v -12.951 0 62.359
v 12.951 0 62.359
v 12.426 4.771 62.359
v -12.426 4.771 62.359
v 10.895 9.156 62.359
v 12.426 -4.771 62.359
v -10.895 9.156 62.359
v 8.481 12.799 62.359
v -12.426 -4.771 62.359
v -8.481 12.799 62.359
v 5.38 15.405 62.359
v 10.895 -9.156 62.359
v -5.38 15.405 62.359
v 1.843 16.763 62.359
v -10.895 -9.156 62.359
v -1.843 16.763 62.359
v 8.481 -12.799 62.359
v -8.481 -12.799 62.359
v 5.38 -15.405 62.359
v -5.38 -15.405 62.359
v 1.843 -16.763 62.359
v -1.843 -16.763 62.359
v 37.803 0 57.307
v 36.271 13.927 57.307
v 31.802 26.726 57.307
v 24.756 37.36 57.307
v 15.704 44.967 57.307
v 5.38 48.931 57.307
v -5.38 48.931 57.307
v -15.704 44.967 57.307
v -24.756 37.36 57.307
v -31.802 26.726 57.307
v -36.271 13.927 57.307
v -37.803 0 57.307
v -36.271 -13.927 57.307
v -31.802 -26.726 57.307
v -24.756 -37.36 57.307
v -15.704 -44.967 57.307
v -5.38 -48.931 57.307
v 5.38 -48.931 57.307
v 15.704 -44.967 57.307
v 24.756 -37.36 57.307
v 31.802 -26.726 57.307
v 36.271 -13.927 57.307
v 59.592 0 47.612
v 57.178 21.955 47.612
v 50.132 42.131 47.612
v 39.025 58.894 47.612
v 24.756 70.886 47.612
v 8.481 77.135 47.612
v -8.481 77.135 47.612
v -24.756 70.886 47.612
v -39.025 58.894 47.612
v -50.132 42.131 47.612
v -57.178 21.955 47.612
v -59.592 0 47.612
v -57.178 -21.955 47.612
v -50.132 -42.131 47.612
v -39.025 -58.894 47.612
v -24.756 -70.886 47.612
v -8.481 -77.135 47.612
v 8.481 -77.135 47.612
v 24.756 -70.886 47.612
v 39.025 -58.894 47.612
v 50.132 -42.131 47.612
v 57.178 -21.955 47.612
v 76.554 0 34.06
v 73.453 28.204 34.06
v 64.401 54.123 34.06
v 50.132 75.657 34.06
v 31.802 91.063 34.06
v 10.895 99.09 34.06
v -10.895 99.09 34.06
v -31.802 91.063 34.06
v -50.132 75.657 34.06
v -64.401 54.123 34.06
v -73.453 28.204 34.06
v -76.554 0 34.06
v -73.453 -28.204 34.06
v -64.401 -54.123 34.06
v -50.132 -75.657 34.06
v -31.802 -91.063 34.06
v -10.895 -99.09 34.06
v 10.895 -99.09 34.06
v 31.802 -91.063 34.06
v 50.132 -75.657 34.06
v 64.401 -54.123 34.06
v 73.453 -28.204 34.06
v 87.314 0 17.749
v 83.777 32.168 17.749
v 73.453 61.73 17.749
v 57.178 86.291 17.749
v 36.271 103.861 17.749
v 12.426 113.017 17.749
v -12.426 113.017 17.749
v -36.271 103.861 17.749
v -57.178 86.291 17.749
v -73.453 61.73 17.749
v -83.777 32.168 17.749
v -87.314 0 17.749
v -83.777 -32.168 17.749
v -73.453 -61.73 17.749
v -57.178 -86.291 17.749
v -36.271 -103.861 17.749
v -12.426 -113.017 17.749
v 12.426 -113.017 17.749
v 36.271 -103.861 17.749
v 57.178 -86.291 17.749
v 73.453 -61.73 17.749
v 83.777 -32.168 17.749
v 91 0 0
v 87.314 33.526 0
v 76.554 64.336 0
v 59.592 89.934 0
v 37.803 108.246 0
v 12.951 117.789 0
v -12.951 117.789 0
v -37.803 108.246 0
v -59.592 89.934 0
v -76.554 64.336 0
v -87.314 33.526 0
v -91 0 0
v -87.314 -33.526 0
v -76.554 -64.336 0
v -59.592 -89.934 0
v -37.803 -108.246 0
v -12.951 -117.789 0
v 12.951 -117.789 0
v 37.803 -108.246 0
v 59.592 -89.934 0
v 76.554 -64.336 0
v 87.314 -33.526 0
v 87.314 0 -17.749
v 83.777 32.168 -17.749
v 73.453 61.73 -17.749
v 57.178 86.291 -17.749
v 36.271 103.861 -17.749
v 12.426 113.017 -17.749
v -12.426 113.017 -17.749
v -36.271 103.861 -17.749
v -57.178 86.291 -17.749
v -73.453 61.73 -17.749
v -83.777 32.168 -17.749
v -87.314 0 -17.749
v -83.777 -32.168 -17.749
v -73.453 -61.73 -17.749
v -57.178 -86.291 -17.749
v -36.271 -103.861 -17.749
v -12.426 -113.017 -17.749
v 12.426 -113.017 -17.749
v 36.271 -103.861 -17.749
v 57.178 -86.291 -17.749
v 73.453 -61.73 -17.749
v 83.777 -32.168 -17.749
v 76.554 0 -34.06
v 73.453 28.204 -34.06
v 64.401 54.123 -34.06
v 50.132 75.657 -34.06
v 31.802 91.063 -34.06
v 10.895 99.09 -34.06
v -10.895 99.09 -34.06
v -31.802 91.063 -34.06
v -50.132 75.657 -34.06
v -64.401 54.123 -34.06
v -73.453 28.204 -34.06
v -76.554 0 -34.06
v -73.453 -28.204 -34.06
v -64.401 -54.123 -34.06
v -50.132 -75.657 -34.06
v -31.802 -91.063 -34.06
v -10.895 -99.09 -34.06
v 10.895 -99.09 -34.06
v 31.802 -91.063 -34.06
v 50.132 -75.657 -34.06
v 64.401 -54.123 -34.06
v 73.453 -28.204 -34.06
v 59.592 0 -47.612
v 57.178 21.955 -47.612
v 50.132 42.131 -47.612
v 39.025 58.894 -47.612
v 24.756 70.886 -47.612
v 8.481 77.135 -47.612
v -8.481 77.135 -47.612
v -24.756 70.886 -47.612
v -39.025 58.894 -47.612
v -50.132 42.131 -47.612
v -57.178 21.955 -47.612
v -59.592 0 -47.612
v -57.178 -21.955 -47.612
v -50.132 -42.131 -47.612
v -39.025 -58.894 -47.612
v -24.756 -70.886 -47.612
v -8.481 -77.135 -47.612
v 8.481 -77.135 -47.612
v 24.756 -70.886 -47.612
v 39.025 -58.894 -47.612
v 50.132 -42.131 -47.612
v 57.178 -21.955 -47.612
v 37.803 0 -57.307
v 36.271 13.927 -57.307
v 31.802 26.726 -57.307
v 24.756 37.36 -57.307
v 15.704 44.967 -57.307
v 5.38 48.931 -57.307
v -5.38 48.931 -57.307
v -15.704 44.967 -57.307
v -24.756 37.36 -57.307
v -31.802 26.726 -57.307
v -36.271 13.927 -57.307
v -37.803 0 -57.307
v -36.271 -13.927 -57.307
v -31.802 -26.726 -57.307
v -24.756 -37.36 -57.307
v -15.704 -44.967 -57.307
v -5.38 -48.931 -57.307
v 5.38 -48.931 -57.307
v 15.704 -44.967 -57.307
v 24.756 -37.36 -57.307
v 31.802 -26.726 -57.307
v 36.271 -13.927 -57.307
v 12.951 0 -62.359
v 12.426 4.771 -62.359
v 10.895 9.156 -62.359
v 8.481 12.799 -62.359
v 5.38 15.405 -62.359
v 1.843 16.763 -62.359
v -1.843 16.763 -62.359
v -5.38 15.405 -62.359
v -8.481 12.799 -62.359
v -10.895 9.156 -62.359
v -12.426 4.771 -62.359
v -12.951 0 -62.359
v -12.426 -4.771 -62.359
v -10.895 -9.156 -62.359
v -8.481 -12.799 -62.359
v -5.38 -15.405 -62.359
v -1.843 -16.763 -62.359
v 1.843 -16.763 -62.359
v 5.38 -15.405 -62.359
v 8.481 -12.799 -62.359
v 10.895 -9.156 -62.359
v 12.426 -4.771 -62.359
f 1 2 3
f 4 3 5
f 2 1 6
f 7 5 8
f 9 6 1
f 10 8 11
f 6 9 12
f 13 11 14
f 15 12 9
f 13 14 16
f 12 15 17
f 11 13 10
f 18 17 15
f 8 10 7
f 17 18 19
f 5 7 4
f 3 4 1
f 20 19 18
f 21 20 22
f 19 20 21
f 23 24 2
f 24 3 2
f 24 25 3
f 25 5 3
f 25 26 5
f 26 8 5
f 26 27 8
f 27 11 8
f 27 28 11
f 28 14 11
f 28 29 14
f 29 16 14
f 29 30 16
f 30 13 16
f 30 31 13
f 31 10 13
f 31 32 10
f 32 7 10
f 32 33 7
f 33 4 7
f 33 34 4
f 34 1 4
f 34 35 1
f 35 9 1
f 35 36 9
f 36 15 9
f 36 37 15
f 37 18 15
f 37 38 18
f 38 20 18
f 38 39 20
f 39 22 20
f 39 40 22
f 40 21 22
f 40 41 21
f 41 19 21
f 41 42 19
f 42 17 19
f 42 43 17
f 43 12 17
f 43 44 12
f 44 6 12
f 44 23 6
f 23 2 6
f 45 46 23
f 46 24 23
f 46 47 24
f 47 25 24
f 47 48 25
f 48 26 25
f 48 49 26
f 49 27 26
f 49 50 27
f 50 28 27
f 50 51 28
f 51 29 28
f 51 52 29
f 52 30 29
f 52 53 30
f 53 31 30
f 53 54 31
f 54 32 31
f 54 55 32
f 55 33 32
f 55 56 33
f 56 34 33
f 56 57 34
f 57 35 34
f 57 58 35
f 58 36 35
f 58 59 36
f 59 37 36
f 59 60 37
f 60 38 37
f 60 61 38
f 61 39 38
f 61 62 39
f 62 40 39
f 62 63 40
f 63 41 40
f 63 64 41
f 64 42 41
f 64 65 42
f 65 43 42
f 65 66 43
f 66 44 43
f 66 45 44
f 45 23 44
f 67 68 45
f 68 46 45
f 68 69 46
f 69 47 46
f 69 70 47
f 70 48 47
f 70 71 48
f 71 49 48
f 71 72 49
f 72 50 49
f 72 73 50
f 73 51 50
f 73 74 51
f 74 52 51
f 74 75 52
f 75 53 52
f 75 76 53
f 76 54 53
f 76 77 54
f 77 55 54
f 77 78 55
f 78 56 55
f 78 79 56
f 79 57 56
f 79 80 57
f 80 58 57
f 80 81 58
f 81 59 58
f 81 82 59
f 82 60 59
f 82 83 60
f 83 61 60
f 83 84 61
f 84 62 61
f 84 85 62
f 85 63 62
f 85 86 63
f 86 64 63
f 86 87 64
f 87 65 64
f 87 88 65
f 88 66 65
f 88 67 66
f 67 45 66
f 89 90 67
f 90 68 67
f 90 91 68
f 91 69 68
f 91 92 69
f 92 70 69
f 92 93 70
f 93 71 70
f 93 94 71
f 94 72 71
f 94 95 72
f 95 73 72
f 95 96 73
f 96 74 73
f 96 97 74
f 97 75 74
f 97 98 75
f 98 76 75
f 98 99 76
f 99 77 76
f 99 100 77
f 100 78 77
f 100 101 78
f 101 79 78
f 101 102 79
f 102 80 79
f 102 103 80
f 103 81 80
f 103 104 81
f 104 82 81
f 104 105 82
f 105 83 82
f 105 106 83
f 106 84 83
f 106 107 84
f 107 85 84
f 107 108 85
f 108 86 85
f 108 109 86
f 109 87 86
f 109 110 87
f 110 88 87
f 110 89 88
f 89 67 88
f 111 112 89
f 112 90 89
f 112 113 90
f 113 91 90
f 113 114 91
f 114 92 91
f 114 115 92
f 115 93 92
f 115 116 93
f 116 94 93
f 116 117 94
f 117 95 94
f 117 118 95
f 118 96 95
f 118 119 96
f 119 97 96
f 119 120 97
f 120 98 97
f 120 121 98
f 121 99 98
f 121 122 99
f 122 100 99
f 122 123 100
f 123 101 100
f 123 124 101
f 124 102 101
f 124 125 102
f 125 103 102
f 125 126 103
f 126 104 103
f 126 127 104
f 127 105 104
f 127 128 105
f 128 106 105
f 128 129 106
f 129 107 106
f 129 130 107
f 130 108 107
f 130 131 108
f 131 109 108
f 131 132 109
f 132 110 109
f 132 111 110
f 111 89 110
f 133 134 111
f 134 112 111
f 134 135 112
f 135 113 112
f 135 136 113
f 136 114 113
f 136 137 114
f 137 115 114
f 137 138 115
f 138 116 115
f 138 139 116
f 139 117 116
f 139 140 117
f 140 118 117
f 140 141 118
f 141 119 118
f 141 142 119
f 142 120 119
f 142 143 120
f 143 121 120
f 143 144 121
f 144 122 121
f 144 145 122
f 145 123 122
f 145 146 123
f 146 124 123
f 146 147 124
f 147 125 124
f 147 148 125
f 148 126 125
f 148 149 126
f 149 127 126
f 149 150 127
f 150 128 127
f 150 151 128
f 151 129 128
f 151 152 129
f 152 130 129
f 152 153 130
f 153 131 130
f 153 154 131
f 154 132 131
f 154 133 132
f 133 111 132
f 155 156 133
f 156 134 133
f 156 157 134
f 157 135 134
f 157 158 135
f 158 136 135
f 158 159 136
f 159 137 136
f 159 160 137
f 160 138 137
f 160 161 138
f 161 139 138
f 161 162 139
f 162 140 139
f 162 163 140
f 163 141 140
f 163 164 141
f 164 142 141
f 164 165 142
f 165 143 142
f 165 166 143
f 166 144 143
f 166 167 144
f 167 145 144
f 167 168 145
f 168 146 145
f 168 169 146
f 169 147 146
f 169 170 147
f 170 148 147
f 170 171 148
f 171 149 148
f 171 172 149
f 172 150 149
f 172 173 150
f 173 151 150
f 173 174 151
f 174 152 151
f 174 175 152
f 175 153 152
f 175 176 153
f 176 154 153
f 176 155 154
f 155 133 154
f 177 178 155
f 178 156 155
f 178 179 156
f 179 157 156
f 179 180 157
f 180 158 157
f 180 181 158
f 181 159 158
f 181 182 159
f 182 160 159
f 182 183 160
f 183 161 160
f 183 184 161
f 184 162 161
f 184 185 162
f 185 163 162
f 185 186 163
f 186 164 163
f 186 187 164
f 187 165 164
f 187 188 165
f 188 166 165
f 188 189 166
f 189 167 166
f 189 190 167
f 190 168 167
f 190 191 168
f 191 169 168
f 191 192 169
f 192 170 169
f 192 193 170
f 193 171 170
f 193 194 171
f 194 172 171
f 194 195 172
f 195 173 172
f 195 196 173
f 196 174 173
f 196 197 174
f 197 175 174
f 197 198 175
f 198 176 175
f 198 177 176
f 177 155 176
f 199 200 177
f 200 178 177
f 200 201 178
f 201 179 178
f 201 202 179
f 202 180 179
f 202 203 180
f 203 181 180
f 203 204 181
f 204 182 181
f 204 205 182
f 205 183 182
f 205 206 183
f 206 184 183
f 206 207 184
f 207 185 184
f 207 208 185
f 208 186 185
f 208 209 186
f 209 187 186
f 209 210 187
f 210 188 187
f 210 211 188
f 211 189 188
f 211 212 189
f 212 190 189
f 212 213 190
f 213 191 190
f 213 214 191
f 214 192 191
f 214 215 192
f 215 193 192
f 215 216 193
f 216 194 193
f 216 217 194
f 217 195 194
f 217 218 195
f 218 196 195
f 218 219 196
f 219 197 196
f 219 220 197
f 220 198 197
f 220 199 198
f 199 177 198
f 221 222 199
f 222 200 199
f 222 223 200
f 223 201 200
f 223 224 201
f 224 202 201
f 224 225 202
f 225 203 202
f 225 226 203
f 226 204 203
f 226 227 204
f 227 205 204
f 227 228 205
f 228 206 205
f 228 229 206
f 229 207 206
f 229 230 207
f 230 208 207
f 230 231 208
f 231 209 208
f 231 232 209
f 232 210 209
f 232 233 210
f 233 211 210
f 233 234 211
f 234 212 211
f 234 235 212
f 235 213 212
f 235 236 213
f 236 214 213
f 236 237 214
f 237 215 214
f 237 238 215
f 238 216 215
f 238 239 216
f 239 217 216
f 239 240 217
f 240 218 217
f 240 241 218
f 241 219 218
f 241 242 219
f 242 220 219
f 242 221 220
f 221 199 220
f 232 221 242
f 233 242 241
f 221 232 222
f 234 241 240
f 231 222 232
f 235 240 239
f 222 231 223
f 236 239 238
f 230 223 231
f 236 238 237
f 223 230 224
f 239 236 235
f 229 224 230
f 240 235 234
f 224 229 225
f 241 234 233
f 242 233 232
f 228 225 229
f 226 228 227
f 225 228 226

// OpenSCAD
// Generated by SolidPython 1.0.1 on 2020-07-29 00:46:51


scale(v = [13, 17, 9]) {
	sphere(r = 7);
}
/***********************************************
*********      SolidPython code:      **********
************************************************
 
# import packages: SolidPython
from solid import *
from solid.utils import *
from itertools import chain, combinations, permutations


class Resize:

    def __init__(self, scad_file):
        self.scad_file = scad_file
        #self.scad_file = import_scad(scad_file)
        # cone/cylinder param:
        self.r1 = 0
        self.r2 = 0
        self.h = 0
        # rectangular prism param:
        self.w = 0
        self.l = 0
        # ellipse param:
        self.r = 0

    # import OpenScad code (file name corresponds to shape)


    # classify shape + parameters
    def assign(self, param1, param2, param3):
        if self.scad_file == 'cone.scad':
            self.r1 = param1
            self.r2 = param2
            self.h = param3
        elif self.scad_file == 'cylinder.scad':
            self.r1 = param1
            self.r2 = param2
            self.h = param3
        elif self.scad_file == 'rectangularPrism.scad':
            self.h = param1
            self.l = param2
            self.w = param3
        else:
            self.r = param1
            self.h = param2

    # resize parameters
    def iterate(self):
        x = range(3, 20, 2)
        i = 1
        if self.scad_file == 'cone.scad':
            tempList = list(permutations(x, 2))
            for temp in tempList:
                param1 = temp[0]
                param2 = temp[1]
                filepath = 'produced_scad_files/' + 'cone' + str(param1) + '_' + str(param2) + '_' + '.scad'
                scad_render_to_file(cylinder(h=param1, r1=param2, r2=0), filepath)

        elif self.scad_file == 'cylinder.scad':
            tempList = list(permutations(x, 3))
            for temp in tempList:
                param1 = temp[0]
                param2 = temp[1]
                filepath = 'produced_scad_files/' + 'cylinder' + str(param1) + '_' + str(param2) + '_' + '.scad'
                scad_render_to_file(cylinder(h=param1, r1=param2, r2=param2), filepath)

        elif self.scad_file == 'rectangularPrism.scad':
            tempList = list(permutations(x, 3))
            for temp in tempList:
                param1 = temp[0]
                param2 = temp[1]
                param3 = temp[2]
                filepath = 'produced_scad_files/' + 'rectangularPrism' + str(param1) + '_' + str(param2) + '_' + str(
                    param3) + '.scad'
                scad_render_to_file(cube(size=(param1, param2, param3)), filepath)

        elif self.scad_file == 'ellipse.scad':
            tempList = list(permutations(x, 4))
            for temp in tempList:
                param1 = temp[0]
                param2 = temp[1]
                param3 = temp[2]
                param4 = temp[3]
                filepath = 'produced_scad_files/' + 'ellipse' + str(param1) + '_' + str(param2) + '_' + str(param3) + '_' + str(param4) + '.scad'
                scad_render_to_file(scale([param1, param2, param3])(sphere(r=param4)), filepath)

    def render_to_scadfile(self):
        scad_render_to_file(scad, 'example.scad') 
 
************************************************/
